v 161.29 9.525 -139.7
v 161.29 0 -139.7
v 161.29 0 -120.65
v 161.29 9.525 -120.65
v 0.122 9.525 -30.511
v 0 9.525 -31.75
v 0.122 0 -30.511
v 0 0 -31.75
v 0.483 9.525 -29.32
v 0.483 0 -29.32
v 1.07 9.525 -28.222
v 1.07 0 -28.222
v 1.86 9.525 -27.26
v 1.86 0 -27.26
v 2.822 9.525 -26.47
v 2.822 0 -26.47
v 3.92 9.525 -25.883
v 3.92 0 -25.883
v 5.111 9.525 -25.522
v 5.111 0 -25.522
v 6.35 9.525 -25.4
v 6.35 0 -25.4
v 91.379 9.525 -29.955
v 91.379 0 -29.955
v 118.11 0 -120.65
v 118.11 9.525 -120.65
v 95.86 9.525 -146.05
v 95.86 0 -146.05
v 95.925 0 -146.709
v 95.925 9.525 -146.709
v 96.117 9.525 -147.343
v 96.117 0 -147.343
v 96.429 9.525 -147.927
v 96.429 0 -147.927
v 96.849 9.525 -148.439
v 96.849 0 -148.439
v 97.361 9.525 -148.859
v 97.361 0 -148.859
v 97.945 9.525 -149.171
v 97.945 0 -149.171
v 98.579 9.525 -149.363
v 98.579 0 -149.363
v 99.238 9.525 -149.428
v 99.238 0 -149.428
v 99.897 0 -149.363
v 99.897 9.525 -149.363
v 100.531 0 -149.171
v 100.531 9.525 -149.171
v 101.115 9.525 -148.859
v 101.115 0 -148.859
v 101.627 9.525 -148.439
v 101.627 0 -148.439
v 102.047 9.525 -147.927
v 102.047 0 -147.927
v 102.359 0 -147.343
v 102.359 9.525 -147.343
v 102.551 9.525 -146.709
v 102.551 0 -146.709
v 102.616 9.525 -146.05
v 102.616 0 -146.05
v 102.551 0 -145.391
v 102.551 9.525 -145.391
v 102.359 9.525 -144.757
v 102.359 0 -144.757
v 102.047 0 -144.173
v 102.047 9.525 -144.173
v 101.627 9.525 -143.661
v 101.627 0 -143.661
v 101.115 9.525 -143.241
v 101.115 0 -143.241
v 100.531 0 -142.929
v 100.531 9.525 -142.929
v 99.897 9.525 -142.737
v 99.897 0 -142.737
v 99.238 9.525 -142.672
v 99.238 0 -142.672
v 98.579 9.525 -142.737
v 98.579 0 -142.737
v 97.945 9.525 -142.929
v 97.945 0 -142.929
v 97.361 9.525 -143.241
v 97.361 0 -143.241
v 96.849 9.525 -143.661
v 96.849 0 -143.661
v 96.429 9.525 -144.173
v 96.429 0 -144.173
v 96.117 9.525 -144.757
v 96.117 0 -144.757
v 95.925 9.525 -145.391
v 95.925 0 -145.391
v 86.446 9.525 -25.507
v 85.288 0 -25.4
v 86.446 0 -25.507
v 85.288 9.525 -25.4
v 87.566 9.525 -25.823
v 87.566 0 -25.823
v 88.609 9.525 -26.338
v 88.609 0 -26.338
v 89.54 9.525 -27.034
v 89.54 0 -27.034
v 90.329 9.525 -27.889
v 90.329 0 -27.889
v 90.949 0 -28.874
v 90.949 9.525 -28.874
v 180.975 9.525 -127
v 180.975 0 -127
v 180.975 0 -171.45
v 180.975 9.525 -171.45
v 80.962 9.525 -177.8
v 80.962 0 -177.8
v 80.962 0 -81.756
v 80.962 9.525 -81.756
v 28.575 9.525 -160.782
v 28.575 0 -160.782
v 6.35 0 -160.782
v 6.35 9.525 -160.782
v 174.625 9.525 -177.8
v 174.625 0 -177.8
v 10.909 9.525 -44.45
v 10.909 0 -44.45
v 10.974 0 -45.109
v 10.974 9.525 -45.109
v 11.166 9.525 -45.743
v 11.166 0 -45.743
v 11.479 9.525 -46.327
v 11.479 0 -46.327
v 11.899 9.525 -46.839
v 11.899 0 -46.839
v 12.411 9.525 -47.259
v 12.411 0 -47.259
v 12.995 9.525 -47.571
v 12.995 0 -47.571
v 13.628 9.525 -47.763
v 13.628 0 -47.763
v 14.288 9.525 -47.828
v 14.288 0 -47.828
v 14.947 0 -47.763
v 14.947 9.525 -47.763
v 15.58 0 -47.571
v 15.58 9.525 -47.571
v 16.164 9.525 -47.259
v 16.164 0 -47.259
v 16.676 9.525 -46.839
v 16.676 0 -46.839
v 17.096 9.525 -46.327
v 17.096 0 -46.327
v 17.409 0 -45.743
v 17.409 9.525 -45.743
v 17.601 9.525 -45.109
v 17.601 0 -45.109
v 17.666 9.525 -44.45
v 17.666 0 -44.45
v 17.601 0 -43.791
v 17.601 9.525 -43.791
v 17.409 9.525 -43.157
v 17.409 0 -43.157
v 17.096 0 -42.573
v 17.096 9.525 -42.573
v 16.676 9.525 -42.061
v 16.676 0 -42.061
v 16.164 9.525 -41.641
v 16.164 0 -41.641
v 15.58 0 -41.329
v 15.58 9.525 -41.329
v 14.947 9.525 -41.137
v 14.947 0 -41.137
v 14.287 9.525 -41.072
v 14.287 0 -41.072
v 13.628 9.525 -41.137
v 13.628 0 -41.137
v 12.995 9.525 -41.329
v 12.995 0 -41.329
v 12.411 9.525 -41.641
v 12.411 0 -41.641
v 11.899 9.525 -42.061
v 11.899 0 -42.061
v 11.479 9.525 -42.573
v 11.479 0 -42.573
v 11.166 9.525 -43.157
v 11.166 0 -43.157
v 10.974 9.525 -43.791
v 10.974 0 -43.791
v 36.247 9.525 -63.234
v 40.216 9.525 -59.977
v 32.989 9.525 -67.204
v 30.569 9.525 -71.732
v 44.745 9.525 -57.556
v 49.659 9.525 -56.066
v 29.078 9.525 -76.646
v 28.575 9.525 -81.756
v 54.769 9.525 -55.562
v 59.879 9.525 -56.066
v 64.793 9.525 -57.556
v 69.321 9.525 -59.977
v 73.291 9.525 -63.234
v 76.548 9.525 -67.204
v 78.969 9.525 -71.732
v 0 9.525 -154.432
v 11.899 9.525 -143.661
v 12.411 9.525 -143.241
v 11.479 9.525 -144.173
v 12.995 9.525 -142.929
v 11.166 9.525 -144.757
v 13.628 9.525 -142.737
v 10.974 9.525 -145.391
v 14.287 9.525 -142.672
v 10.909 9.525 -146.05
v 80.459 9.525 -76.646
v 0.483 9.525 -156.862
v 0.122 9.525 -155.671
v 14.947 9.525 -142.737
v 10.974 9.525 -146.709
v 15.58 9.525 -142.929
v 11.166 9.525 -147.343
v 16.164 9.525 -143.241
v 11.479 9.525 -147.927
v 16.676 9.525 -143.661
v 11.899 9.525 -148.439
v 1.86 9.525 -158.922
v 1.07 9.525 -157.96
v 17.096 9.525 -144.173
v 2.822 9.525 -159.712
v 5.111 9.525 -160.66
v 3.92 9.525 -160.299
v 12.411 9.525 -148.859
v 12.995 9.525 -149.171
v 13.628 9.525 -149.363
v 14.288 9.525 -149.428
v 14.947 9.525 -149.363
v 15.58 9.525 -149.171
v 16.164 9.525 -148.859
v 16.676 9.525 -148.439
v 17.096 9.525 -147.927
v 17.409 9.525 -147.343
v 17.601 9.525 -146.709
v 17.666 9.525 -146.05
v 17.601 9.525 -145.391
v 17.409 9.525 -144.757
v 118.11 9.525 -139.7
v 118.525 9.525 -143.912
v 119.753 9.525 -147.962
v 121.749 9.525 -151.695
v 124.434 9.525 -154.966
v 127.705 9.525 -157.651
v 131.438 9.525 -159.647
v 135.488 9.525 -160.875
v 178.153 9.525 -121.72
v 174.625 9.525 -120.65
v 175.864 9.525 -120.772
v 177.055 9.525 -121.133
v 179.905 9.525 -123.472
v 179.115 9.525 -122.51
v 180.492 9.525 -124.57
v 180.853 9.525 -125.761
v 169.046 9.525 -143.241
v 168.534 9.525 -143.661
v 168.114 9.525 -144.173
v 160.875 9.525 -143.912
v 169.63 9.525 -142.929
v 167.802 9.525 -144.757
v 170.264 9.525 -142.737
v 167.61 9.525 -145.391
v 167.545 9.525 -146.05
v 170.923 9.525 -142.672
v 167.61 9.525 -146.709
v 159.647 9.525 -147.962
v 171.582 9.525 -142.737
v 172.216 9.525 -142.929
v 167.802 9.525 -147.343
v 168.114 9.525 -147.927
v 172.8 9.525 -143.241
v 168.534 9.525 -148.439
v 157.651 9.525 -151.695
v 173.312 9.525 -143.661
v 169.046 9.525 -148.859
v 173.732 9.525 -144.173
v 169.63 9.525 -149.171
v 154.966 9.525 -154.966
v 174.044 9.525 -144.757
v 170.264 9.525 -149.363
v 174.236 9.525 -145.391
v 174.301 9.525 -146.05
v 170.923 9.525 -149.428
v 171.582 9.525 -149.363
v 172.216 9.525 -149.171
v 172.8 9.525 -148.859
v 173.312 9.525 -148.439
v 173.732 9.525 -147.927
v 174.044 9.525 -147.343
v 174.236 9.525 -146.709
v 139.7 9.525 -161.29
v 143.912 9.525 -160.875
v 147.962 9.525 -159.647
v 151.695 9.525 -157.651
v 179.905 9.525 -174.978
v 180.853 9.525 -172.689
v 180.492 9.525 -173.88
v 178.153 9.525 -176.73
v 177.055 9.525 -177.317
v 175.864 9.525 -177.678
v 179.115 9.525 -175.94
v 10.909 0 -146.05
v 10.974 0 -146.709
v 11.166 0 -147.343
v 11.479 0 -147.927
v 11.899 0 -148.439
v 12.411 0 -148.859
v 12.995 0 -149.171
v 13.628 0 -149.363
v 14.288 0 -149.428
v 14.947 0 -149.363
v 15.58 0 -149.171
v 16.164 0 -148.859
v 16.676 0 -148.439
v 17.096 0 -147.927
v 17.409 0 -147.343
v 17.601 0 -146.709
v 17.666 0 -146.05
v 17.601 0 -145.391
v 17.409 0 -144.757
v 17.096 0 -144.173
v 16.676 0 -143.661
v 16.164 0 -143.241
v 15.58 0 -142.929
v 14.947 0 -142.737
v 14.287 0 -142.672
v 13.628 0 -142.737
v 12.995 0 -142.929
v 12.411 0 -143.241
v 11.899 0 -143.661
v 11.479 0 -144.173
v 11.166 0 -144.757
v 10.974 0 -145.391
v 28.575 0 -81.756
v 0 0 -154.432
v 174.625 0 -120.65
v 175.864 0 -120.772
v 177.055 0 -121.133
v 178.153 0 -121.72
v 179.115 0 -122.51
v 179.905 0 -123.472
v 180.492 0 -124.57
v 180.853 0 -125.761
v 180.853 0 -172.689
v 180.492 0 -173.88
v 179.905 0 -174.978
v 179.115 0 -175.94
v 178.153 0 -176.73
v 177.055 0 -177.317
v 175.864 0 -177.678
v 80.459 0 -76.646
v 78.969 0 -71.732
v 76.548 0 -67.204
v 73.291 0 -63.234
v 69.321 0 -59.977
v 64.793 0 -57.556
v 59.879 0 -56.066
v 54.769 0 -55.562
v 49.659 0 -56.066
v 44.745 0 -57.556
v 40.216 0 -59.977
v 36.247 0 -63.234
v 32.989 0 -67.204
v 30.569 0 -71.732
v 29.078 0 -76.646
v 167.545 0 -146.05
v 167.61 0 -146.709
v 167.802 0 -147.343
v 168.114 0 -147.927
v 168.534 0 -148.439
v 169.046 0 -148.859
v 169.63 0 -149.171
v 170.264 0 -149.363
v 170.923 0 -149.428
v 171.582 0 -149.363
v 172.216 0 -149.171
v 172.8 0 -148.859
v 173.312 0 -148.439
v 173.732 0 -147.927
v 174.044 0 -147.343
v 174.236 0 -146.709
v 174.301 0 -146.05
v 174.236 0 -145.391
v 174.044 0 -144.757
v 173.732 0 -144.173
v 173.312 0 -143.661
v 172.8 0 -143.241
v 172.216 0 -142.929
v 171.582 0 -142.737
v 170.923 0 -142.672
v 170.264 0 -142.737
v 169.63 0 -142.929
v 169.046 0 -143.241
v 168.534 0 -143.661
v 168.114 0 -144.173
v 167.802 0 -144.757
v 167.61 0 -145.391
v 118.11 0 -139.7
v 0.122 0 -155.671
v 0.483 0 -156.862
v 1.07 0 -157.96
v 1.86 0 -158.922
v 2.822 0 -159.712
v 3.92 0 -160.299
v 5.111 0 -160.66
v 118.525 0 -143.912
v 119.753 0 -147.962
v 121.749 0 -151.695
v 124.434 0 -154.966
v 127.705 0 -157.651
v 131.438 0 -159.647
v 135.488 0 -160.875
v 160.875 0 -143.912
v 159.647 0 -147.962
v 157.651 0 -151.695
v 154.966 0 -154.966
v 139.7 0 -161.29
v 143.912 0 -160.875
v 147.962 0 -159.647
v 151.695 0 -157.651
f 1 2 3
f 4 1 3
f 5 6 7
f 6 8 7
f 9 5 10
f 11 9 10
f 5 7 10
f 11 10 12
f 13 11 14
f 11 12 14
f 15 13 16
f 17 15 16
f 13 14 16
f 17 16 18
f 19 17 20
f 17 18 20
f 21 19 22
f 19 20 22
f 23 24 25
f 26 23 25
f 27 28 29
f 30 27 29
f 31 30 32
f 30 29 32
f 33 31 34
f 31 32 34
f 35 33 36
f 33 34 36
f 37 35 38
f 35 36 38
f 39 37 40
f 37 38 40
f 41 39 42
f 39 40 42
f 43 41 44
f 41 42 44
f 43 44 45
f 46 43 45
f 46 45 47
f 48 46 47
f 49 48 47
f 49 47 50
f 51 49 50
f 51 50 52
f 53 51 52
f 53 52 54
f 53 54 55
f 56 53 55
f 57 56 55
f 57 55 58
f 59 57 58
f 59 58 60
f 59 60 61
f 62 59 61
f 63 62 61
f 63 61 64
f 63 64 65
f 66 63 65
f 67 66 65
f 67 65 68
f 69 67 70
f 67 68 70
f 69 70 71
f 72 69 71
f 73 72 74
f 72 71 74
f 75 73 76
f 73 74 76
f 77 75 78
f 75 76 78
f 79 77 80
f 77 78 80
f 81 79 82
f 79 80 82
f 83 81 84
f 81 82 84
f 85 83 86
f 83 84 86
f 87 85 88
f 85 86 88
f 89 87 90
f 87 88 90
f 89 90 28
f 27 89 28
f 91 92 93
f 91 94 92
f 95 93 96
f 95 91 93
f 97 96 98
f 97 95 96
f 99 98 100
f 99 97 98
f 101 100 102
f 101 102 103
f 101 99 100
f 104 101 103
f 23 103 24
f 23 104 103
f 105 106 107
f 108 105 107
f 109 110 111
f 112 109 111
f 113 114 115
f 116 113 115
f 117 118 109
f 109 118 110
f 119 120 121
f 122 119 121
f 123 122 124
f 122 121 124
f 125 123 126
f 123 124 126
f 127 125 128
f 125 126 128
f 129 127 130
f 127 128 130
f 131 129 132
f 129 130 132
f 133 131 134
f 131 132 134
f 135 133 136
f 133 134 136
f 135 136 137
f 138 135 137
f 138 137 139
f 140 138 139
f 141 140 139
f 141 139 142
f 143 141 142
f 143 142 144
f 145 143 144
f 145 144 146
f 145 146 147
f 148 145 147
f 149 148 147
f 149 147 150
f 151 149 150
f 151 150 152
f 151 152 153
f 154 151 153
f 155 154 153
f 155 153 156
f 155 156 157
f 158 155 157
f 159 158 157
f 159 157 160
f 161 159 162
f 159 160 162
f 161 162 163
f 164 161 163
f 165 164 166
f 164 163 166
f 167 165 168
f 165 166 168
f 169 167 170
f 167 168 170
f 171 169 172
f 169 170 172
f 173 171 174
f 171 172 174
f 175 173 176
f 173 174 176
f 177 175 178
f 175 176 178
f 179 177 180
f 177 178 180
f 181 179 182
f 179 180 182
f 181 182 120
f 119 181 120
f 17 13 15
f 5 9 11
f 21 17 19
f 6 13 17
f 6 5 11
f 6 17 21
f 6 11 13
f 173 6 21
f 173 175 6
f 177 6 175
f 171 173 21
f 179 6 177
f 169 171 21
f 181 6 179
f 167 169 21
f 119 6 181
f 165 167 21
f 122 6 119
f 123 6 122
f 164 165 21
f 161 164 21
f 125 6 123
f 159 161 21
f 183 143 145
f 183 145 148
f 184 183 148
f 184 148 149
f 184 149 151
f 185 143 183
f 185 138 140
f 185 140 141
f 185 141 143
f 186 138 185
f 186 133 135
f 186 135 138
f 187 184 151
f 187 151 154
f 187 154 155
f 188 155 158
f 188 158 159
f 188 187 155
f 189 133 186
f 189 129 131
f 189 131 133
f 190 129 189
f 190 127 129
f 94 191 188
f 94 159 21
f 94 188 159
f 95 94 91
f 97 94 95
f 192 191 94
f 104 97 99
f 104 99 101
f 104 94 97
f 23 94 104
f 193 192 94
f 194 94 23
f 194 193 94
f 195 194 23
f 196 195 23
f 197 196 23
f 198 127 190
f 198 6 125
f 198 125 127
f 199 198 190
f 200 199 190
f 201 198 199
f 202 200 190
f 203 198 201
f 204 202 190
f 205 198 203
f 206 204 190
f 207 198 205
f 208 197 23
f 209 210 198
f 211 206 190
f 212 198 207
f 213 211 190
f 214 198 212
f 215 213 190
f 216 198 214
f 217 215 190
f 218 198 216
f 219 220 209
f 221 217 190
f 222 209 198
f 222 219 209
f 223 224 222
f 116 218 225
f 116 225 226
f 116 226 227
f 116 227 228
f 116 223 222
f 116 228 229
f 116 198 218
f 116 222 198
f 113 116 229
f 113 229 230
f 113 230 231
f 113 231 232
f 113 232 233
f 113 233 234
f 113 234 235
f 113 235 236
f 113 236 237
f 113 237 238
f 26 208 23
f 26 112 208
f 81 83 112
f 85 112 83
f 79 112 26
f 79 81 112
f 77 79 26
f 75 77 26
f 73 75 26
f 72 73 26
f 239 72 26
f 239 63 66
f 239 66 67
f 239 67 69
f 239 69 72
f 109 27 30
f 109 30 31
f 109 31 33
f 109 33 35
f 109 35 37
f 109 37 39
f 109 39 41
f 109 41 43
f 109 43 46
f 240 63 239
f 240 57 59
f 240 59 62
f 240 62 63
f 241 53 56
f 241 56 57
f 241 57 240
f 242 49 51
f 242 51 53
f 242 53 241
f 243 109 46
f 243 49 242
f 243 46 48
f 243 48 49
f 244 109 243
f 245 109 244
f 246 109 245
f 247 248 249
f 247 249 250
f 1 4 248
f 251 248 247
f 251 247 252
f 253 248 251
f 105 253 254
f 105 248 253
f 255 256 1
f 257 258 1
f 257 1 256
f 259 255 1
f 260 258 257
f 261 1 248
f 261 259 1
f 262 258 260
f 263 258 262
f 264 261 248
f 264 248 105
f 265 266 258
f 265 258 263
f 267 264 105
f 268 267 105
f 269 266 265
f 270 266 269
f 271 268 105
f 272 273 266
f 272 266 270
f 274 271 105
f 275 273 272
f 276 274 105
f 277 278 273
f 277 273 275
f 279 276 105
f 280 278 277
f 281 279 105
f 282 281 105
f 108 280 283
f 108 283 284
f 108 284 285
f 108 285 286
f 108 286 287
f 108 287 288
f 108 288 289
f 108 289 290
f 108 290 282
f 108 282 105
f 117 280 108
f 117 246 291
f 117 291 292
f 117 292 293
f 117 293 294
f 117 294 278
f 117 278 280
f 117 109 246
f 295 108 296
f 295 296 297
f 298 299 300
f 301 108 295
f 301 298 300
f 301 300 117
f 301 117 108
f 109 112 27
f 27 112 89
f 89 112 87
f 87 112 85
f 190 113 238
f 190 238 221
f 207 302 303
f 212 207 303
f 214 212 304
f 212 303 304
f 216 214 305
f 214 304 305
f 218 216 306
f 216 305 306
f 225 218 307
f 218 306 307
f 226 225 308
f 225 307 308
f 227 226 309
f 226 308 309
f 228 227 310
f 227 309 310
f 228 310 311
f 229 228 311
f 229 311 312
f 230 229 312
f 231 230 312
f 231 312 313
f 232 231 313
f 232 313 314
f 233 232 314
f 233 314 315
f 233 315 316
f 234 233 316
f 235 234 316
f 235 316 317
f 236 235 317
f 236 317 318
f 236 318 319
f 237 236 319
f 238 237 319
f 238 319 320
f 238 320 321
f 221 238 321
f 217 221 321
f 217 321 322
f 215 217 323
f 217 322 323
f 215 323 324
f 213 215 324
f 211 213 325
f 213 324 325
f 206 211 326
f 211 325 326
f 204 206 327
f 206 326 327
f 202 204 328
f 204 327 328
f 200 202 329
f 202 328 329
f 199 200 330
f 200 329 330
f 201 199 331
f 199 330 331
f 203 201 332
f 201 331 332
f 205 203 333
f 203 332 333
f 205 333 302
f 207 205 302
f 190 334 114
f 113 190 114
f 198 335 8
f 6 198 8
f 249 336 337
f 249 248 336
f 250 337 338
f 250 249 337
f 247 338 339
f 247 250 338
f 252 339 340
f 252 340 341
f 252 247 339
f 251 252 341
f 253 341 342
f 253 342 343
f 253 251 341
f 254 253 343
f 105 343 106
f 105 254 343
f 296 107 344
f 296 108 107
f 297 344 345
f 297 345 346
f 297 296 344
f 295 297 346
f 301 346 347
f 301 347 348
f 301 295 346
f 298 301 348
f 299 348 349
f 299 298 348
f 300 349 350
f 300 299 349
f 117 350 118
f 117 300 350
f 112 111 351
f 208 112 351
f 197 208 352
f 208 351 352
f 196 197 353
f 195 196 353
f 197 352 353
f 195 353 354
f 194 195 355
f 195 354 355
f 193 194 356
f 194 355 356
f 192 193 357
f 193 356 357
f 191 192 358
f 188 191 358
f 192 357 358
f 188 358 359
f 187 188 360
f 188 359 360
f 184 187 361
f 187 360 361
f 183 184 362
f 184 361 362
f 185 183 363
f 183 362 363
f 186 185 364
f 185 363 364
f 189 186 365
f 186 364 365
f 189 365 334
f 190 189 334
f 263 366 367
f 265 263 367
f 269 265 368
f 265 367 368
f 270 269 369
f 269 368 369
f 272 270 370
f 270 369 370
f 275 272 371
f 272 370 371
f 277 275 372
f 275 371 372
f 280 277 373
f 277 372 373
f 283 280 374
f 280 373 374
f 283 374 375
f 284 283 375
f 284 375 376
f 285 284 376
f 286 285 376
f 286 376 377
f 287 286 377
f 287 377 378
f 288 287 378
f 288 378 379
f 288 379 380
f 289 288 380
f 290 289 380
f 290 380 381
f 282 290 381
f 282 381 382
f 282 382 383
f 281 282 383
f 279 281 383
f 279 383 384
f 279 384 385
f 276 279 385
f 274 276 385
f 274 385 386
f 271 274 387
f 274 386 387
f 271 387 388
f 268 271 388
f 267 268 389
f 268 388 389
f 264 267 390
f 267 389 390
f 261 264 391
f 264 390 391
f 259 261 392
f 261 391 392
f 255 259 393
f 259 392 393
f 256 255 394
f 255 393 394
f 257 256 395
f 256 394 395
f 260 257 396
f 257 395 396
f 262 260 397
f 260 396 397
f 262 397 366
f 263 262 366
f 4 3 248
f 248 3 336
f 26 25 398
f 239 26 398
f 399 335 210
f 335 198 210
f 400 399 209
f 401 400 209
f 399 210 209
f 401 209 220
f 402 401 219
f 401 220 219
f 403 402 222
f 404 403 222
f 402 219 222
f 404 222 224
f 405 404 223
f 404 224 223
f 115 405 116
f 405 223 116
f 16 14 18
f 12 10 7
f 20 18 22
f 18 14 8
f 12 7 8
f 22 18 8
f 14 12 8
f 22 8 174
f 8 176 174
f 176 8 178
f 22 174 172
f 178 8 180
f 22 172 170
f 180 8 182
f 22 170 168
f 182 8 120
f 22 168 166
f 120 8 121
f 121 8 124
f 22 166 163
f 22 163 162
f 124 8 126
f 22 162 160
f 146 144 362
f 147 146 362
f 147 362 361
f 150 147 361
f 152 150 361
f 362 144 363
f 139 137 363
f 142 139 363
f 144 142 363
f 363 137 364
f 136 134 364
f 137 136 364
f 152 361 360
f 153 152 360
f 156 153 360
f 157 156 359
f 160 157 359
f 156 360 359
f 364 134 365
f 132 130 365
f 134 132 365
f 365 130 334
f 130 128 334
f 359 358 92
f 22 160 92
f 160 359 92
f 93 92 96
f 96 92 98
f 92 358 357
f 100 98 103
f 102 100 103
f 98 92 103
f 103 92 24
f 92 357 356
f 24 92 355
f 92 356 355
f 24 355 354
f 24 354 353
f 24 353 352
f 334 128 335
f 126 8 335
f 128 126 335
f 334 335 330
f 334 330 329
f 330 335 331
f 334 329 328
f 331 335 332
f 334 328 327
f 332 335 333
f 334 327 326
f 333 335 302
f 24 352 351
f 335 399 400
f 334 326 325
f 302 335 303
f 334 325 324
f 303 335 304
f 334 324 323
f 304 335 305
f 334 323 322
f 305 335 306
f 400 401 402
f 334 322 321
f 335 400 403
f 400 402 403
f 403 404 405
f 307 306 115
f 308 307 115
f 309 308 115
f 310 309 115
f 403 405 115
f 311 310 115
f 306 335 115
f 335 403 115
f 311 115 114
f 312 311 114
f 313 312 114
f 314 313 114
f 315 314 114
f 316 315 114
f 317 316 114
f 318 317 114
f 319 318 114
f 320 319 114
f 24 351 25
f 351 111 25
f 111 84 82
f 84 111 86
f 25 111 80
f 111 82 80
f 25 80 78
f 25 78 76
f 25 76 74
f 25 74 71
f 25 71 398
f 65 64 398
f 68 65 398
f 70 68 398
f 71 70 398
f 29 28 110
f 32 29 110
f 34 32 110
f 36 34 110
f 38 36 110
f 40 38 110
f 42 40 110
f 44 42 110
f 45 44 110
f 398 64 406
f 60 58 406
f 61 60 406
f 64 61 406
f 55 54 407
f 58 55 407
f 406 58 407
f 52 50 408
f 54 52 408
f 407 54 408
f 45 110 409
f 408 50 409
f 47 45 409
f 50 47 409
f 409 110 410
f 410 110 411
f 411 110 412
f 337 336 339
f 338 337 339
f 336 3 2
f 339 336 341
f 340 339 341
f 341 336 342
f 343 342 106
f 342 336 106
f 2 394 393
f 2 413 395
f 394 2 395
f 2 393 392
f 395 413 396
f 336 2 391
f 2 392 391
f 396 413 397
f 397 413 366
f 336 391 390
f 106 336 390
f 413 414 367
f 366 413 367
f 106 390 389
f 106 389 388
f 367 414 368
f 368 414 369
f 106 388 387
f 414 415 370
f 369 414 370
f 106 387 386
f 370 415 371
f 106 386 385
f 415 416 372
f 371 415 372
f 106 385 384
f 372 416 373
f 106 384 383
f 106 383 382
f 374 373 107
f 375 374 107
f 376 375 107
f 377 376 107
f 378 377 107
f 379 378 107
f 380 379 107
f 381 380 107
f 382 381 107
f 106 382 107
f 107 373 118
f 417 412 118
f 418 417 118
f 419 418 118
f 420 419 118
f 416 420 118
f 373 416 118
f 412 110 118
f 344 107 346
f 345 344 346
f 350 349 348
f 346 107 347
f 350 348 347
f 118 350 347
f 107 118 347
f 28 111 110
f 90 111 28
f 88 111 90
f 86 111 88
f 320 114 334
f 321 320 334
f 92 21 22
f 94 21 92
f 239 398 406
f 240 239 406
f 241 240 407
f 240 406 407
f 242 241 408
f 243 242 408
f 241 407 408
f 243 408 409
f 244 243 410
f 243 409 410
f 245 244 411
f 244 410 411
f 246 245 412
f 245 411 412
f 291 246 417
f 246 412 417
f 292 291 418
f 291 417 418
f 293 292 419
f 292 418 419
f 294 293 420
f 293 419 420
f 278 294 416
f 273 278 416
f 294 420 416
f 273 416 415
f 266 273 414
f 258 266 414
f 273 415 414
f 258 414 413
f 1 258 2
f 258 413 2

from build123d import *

# Parameters (mm, degrees)
BOSS_EXTRUDE1_DEPTH     = 9.525
SKETCH2_W               = 94.331668948
SKETCH2_H               = 25.4
CUT_EXTRUDE1_DEPTH      = 254.880909582
FILLET1_R               = 6.35
FILLET2_R               = 6.35
F_1_4_CLEARANCE_HOLE1_D = 6.7564


with BuildPart() as part:
    # Sketch1 → Boss-Extrude1 (new body)
    with BuildSketch(Plane(origin=(0, 0, 0), x_dir=(1, 0, 0), z_dir=(0, 1, 0))):
        with BuildLine():
            Line((28.575, 81.75625), (28.575, 160.782))
            Line((28.575, 160.782), (0, 160.782))
            Line((0, 160.782), (0, 0))
            Line((0, 0), (82.55, 0))
            Line((82.55, 0), (118.11, 120.65))
            Line((118.11, 120.65), (118.11, 139.7))
            ThreePointArc((118.11, 139.7), (139.7, 161.29), (161.29, 139.7))
            Line((161.29, 139.7), (161.29, 120.65))
            Line((161.29, 120.65), (180.975, 120.65))
            Line((180.975, 120.65), (180.975, 139.7))
            Line((180.975, 139.7), (180.975, 177.8))
            Line((180.975, 177.8), (121.7041, 177.8))
            Line((121.7041, 177.8), (80.9625, 177.8))
            Line((80.9625, 177.8), (80.9625, 81.75625))
            ThreePointArc((80.9625, 81.75625), (54.76875, 55.5625), (28.575, 81.75625))
        make_face()
    extrude(amount=BOSS_EXTRUDE1_DEPTH)

    # Sketch2 → Cut-Extrude1 (cut, through all)
    with BuildSketch(Plane(origin=(0, 9.525, 0), x_dir=(1, 0, 0), z_dir=(0, 1, 0))):
        with Locations((47.165834474, 12.7)):
            Rectangle(SKETCH2_W, SKETCH2_H)
    extrude(amount=-CUT_EXTRUDE1_DEPTH, mode=Mode.SUBTRACT)

    # Fillet1
    fillet1_edges = [part.edges().sort_by_distance(p)[0] for p in [
        (0, 4.7625, -25.4),
    ]]
    fillet(fillet1_edges, radius=FILLET1_R)

    # Fillet2
    fillet2_edges = [part.edges().sort_by_distance(p)[0] for p in [
        (0, 4.7625, -160.782),
        (180.975, 4.7625, -177.8),
        (180.975, 4.7625, -120.65),
        (90.036315789, 4.7625, -25.4),
    ]]
    fillet(fillet2_edges, radius=FILLET2_R)

    # 1/4 Clearance Hole1 (through all)
    with Locations(Plane(origin=(0, 9.525, 0), x_dir=(1, 0, 0), z_dir=(0, 1, 0))):
        with Locations((14.2875, 146.05), (14.2875, 44.45), (99.2378, 146.05), (170.92295, 146.05)):
            Hole(F_1_4_CLEARANCE_HOLE1_D / 2)


solid = part.part
